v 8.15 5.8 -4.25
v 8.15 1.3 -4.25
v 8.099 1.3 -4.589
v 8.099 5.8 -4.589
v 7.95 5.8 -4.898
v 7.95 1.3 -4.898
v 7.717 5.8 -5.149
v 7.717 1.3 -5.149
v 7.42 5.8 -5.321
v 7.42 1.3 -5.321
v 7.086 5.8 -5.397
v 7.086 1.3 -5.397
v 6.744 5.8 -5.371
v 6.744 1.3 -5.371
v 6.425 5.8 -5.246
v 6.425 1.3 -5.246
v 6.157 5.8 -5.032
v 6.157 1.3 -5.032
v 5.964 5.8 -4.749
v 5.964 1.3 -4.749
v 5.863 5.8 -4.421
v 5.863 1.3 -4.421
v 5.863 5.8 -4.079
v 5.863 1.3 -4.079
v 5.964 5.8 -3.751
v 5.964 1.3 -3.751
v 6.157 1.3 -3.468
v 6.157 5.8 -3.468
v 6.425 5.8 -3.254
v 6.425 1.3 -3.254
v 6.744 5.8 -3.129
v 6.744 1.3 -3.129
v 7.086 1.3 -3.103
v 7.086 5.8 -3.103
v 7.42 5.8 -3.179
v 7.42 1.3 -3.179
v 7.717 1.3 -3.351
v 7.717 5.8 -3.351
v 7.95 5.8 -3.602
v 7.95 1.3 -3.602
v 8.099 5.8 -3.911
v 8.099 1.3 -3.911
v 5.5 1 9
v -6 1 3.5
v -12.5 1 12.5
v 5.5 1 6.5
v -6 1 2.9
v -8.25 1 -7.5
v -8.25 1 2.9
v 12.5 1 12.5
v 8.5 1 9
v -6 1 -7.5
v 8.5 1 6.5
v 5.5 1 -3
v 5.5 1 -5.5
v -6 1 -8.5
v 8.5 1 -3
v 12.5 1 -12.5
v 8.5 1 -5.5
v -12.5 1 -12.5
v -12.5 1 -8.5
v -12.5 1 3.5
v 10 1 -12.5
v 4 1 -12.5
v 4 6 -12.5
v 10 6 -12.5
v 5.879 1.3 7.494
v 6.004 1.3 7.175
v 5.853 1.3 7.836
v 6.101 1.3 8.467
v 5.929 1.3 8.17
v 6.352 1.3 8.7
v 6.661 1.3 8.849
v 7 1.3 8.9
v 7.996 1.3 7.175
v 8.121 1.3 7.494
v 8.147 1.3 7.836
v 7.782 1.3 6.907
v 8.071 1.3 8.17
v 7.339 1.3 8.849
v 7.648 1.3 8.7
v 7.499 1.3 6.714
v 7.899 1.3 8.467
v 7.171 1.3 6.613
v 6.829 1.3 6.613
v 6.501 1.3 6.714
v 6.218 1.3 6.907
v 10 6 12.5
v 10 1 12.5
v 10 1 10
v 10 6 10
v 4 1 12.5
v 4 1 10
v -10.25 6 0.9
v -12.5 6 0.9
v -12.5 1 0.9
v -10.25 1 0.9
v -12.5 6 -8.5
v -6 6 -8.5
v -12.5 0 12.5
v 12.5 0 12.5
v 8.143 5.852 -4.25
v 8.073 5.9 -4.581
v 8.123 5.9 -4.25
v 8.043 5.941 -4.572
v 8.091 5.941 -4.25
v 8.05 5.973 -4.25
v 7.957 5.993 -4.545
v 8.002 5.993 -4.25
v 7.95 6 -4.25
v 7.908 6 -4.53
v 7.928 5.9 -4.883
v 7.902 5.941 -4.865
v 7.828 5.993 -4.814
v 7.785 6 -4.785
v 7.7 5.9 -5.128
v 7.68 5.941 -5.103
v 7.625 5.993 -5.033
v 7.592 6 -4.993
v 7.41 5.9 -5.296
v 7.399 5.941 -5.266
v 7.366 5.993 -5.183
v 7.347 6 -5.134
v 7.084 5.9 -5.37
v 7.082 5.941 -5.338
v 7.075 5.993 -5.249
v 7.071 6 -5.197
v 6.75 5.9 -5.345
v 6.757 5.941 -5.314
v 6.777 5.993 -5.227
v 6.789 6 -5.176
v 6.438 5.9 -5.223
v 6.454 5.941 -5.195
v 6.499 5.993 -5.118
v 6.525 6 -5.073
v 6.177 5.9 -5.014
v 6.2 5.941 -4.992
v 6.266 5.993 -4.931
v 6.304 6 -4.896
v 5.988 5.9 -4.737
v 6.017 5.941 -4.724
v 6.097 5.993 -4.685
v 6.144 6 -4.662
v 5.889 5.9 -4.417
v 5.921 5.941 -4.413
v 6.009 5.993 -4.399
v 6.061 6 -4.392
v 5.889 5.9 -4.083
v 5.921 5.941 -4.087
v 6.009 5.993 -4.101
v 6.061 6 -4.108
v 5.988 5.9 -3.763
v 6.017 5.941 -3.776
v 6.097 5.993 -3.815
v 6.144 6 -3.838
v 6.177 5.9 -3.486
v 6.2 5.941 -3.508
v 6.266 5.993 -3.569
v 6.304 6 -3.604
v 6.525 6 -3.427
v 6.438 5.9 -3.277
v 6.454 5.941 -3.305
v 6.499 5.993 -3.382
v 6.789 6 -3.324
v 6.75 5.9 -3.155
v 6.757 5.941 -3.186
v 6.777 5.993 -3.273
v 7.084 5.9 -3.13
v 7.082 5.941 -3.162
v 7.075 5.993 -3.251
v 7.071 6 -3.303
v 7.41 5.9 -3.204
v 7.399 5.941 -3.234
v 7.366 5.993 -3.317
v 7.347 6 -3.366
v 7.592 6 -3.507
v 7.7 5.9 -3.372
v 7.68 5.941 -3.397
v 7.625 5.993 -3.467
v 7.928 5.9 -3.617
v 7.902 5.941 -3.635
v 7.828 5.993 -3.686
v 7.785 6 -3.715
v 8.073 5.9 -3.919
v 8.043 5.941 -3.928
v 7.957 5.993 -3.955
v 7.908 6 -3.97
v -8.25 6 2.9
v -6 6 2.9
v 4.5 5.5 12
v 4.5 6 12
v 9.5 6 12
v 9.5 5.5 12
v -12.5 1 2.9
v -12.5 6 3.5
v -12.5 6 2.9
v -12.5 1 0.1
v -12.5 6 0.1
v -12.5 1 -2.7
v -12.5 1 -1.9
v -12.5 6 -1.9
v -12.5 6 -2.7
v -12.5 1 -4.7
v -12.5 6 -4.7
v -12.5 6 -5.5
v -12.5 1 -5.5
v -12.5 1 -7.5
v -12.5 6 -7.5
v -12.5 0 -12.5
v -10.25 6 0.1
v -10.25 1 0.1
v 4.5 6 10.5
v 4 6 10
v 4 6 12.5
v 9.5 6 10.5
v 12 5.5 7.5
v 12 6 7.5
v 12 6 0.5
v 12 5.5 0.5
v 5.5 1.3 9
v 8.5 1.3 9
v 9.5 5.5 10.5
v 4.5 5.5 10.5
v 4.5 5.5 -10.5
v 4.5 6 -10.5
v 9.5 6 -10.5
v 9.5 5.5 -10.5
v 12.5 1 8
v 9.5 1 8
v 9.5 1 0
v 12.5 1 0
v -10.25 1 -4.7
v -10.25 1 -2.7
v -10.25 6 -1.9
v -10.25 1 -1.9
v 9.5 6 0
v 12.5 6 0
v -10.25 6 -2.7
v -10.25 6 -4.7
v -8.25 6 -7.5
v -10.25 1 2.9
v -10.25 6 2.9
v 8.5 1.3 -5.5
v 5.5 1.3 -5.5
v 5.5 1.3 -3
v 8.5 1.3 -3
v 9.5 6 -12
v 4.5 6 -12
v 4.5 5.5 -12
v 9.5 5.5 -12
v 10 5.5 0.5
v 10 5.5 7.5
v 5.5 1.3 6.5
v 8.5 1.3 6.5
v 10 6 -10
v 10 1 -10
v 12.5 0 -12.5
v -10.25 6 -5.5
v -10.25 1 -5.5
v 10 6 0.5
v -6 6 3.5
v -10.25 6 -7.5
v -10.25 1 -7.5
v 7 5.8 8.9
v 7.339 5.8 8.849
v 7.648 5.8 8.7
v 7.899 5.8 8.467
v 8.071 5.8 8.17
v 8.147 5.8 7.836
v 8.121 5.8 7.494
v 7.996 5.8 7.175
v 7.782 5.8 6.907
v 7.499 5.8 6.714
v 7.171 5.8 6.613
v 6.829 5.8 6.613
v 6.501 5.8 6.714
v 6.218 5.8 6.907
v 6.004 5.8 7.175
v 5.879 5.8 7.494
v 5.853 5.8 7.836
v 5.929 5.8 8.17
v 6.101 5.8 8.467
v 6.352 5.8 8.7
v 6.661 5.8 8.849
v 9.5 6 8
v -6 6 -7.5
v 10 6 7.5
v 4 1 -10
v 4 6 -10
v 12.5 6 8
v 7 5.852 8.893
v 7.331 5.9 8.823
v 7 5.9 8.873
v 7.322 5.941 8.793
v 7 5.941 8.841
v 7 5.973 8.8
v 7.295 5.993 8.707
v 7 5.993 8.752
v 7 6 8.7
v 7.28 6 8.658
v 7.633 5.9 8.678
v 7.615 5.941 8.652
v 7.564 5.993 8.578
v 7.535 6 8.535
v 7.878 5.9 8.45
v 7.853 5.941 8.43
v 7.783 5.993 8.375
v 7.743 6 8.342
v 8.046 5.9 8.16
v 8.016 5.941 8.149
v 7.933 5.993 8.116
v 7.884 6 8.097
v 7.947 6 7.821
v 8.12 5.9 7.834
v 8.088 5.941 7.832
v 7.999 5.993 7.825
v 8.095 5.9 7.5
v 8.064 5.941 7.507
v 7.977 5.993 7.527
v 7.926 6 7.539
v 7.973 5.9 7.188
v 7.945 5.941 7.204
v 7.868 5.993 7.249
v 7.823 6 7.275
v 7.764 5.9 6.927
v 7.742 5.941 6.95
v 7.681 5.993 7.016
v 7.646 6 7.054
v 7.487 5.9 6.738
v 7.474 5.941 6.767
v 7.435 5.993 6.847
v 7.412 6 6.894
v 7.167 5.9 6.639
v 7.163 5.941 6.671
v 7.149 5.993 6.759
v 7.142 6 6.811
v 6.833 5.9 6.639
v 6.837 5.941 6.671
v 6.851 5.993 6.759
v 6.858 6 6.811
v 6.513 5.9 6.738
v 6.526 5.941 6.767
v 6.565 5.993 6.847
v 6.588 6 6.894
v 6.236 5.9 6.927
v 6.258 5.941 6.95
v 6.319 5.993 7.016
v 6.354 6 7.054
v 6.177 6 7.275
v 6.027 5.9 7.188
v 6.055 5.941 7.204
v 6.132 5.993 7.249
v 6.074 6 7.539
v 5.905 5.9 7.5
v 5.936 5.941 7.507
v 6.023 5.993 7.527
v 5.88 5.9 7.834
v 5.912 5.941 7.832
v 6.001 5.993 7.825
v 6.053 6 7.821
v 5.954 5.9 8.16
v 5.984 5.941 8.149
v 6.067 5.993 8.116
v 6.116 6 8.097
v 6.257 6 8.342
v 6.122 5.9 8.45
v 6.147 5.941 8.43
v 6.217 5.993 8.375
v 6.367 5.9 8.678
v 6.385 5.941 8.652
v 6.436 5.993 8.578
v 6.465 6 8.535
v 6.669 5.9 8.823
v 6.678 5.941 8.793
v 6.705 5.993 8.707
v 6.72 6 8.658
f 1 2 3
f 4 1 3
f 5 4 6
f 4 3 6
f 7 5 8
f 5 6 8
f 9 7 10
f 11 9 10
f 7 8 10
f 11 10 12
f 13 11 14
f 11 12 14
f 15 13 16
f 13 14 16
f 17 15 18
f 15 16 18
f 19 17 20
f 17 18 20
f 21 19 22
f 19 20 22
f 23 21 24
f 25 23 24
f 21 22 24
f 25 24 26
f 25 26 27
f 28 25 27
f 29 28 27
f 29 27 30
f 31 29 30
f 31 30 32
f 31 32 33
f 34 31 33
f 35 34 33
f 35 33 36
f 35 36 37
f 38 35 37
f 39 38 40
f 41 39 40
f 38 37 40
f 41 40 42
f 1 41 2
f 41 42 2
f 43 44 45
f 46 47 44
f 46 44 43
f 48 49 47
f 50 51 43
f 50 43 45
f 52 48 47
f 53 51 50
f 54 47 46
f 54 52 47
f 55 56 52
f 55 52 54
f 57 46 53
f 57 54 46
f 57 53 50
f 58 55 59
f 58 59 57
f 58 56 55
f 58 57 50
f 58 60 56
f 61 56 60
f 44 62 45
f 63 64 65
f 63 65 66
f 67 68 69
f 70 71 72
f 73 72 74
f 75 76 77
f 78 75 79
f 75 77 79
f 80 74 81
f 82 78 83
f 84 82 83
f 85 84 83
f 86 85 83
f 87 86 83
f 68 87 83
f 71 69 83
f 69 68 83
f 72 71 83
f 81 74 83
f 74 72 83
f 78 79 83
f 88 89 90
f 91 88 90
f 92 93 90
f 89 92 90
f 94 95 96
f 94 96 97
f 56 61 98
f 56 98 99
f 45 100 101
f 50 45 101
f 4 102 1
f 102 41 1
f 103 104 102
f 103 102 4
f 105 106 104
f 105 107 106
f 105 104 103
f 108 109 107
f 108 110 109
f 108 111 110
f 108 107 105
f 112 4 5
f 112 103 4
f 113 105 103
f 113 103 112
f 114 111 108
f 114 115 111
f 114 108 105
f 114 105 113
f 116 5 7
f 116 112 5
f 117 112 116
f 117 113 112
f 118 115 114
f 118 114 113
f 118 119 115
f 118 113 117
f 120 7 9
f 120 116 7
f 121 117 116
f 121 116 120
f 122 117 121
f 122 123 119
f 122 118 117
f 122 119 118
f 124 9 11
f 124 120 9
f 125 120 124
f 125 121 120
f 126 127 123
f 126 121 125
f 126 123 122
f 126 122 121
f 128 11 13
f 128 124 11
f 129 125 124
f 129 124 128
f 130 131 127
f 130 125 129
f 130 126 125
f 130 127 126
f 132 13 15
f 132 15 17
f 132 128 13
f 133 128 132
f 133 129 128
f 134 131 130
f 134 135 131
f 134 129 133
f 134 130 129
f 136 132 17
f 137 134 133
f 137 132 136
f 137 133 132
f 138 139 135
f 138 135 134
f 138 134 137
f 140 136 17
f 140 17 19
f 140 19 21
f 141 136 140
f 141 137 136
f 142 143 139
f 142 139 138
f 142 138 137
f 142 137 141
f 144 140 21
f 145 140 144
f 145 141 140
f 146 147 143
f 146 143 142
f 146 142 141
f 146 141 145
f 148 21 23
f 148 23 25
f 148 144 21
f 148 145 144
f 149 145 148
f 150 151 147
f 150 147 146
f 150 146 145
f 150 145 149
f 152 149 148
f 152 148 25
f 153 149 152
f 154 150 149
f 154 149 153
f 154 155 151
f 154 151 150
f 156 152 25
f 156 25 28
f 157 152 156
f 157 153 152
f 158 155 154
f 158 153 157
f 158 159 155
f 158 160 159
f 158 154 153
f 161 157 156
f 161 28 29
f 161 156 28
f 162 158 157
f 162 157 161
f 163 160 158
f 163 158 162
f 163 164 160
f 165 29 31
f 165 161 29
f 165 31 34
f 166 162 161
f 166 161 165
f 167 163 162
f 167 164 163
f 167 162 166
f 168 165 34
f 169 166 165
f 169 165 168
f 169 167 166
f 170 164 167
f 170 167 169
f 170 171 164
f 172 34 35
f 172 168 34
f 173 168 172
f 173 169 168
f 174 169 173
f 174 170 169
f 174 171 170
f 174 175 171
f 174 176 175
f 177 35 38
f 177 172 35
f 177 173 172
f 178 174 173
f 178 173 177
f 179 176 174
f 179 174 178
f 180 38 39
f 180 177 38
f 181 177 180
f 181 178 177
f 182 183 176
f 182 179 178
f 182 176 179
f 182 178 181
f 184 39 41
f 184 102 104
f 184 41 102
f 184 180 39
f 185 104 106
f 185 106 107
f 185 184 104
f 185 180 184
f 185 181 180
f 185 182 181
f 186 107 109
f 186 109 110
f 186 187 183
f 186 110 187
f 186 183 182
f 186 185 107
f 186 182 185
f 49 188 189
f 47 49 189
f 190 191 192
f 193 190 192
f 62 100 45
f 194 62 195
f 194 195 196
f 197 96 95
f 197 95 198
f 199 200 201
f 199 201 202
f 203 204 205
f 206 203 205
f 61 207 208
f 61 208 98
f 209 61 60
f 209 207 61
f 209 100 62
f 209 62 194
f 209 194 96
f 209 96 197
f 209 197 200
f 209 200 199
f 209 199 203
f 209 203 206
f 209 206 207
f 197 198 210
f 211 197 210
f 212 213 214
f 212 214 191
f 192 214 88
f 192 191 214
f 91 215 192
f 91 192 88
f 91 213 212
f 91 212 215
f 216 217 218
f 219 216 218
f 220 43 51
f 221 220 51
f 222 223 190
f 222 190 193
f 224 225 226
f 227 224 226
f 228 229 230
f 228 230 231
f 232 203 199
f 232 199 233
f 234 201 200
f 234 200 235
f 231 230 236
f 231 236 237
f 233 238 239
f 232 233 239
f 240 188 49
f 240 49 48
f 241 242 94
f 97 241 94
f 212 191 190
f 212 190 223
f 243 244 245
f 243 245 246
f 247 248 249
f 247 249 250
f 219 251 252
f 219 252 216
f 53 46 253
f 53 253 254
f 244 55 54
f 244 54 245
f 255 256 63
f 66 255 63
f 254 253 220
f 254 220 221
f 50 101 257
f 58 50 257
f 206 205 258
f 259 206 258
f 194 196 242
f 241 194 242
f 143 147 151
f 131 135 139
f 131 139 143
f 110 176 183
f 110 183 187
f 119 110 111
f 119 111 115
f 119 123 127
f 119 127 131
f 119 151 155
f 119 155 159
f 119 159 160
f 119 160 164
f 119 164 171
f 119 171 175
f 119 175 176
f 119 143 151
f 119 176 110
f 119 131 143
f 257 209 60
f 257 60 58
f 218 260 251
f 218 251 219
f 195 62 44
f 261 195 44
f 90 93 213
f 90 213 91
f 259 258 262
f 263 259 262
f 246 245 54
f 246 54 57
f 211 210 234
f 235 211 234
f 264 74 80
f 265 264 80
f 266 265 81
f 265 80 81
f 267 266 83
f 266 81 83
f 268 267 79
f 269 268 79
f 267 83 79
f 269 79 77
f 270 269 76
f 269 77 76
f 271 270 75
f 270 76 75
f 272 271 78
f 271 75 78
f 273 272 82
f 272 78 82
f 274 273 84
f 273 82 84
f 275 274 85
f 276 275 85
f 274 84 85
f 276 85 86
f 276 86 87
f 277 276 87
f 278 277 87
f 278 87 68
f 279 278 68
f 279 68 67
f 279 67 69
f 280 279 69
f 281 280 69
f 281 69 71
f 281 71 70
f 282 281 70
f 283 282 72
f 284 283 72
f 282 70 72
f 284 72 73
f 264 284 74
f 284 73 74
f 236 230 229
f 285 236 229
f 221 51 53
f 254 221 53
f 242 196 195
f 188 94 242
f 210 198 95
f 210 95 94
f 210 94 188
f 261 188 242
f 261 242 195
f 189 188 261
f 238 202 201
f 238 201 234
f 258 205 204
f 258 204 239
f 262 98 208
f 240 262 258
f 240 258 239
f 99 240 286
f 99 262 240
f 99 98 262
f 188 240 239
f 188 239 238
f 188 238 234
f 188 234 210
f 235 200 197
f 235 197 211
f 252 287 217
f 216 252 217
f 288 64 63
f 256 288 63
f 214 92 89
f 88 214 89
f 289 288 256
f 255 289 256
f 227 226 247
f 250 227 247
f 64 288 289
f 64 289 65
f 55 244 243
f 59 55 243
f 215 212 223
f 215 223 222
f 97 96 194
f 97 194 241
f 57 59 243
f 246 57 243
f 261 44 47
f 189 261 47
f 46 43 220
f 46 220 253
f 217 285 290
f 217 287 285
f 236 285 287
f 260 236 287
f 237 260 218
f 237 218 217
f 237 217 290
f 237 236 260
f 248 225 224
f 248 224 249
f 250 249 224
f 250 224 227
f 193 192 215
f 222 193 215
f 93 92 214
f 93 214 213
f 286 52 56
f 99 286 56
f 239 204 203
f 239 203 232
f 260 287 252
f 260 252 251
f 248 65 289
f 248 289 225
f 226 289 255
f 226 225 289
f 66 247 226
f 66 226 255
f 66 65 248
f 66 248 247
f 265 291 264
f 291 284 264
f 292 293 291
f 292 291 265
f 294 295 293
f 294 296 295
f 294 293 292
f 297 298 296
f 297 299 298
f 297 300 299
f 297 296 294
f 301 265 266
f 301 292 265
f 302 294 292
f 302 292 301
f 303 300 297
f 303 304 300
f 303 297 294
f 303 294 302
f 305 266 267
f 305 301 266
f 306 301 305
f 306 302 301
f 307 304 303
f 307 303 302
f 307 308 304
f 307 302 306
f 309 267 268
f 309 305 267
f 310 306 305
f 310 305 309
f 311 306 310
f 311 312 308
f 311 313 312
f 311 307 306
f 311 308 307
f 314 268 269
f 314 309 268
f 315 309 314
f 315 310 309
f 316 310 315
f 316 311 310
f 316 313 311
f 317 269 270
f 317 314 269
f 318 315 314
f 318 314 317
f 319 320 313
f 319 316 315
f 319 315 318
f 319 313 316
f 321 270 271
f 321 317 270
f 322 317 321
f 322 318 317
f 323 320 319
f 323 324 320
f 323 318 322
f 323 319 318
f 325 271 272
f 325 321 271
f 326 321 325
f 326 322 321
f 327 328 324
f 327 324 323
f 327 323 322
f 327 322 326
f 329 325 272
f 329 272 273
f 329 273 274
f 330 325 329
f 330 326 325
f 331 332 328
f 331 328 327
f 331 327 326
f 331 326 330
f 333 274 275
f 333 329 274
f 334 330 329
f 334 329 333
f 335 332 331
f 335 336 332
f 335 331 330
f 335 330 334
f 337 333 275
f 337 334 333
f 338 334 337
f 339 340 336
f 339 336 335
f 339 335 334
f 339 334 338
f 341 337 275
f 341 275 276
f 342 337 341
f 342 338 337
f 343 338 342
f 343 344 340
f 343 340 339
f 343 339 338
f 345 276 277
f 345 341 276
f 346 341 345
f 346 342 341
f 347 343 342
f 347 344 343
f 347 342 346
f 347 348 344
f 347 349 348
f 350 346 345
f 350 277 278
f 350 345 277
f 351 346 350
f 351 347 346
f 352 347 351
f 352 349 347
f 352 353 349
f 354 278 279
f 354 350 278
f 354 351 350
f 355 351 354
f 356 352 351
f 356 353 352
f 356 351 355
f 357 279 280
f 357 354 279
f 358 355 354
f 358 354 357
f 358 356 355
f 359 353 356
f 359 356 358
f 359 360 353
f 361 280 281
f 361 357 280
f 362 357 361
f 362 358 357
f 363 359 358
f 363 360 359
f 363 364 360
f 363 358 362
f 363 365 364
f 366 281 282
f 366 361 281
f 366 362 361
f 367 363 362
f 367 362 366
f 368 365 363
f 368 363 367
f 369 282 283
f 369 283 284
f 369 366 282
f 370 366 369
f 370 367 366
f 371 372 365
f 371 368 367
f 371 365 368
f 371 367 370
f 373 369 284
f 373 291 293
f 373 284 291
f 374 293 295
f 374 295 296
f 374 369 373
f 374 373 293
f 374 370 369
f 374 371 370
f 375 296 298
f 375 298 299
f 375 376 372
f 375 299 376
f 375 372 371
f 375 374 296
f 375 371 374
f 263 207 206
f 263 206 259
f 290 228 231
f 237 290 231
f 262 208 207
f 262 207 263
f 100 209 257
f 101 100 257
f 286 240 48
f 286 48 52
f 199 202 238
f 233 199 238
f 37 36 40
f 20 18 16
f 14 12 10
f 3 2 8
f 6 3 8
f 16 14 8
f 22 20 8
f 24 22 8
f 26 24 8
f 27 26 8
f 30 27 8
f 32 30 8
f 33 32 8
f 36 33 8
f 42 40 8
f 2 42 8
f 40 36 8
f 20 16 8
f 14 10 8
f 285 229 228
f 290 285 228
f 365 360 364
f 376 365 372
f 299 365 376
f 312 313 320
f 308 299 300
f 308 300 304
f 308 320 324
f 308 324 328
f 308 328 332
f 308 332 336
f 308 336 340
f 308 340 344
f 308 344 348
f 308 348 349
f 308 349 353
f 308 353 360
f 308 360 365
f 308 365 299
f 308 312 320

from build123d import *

# Parameters (mm, degrees)
SKETCH1_W             = 25
SKETCH1_H             = 25
BOSS_EXTRUDE1_DEPTH   = 1
SKETCH2_W             = 3
SKETCH2_H             = 2.5
SKETCH2_H_2           = 2.75
BOSS_EXTRUDE2_DEPTH   = 5
SKETCH3_W             = 2
SKETCH3_H             = 7
CUT_EXTRUDE1_DEPTH    = 0.5
SKETCH4_W             = 6
SKETCH4_H             = 2.5
BOSS_EXTRUDE3_DEPTH   = 5
BOSS_EXTRUDE3_2_DEPTH = 5
SKETCH5_W             = 5
SKETCH5_H             = 1.5
CUT_EXTRUDE2_DEPTH    = 0.5
SKETCH6_W             = 6.5
SKETCH6_H             = 12
BOSS_EXTRUDE4_DEPTH   = 5
SKETCH7_W             = 2.25
SKETCH7_H             = 2
CUT_EXTRUDE3_DEPTH    = 5
SKETCH8_W             = 2.25
SKETCH8_H             = 10.4
CUT_EXTRUDE4_DEPTH    = 5
SKETCH9_W             = 3
SKETCH9_H             = 2.5
BOSS_EXTRUDE5_DEPTH   = 0.3
SKETCH10_R            = 1.15
BOSS_EXTRUDE6_DEPTH   = 4.7
FILLET1_R             = 0.2
LPATTERN1_START       = 1.3
LPATTERN1_OUTLINE_R   = 1.15
LPATTERN1_DEPTH       = 4.7
LPATTERN1_START_2     = -5.5
LPATTERN1_2_OUTLINE_W = 3
LPATTERN1_2_OUTLINE_H = 0.3
LPATTERN1_2_DEPTH     = 2.5
FILLET2_R             = 0.2


# Read off the part's stored shape, not the designer's step: LPattern1
with BuildPart() as part:
    # Sketch1 → Boss-Extrude1 (new body)
    with BuildSketch(Plane(origin=(0, 0, 0), x_dir=(1, 0, 0), z_dir=(0, 1, 0))):
        Rectangle(SKETCH1_W, SKETCH1_H)
    extrude(amount=BOSS_EXTRUDE1_DEPTH)

    # Sketch6 → Boss-Extrude4 (add)
    with BuildSketch(Plane(origin=(0, 1, 0), x_dir=(1, 0, 0), z_dir=(0, 1, 0))):
        with Locations((-9.25, 2.5)):
            Rectangle(SKETCH6_W, SKETCH6_H)
    extrude(amount=BOSS_EXTRUDE4_DEPTH)

    # Sketch7 → Cut-Extrude3 (cut)
    with BuildSketch(Plane(origin=(0, 6, 0), x_dir=(1, 0, 0), z_dir=(0, 1, 0))):
        with Locations((-11.375, 6.5)):
            Rectangle(SKETCH7_W, SKETCH7_H)
        with Locations((-11.375, 3.7)):
            Rectangle(SKETCH7_W, SKETCH7_H)
        with Locations((-11.375, 0.9)):
            Rectangle(SKETCH7_W, SKETCH7_H)
        with Locations((-11.375, -1.9)):
            Rectangle(SKETCH7_W, SKETCH7_H)
    extrude(amount=-CUT_EXTRUDE3_DEPTH, mode=Mode.SUBTRACT)

    # Sketch8 → Cut-Extrude4 (cut)
    with BuildSketch(Plane(origin=(0, 6, 0), x_dir=(1, 0, 0), z_dir=(0, 1, 0))):
        with Locations((-7.125, 2.3)):
            Rectangle(SKETCH8_W, SKETCH8_H)
    extrude(amount=-CUT_EXTRUDE4_DEPTH, mode=Mode.SUBTRACT)

    # Sketch9 → Boss-Extrude5 (add)
    with BuildSketch(Plane(origin=(0, 1, 0), x_dir=(1, 0, 0), z_dir=(0, 1, 0))):
        with Locations((7, -7.75)):
            Rectangle(SKETCH9_W, SKETCH9_H)
    extrude(amount=BOSS_EXTRUDE5_DEPTH)

    # LPattern1 2 outline → LPattern1 2 (add)
    with BuildSketch(Plane.XY.offset(LPATTERN1_START_2)):
        with Locations((7, 1.15)):
            Rectangle(LPATTERN1_2_OUTLINE_W, LPATTERN1_2_OUTLINE_H)
    extrude(amount=LPATTERN1_2_DEPTH)


with BuildPart() as body_2:
    # Sketch2 → Boss-Extrude2 (new body)
    with BuildSketch(Plane(origin=(0, 1, 0), x_dir=(1, 0, 0), z_dir=(0, 1, 0))):
        with Locations((11, -6.75)):
            Rectangle(SKETCH2_W, SKETCH2_H)
        with Locations((11, -4.125)):
            Rectangle(SKETCH2_W, SKETCH2_H_2)
        with Locations((11, -1.375)):
            Rectangle(SKETCH2_W, SKETCH2_H_2)
    extrude(amount=BOSS_EXTRUDE2_DEPTH)

    # Sketch3 → Cut-Extrude1 (cut)
    with BuildSketch(Plane(origin=(0, 6, 0), x_dir=(1, 0, 0), z_dir=(0, 1, 0))):
        with Locations((11, -4)):
            Rectangle(SKETCH3_W, SKETCH3_H)
    extrude(amount=-CUT_EXTRUDE1_DEPTH, mode=Mode.SUBTRACT)


with BuildPart() as body_3:
    # Sketch4 → Boss-Extrude3 (new body)
    with BuildSketch(Plane(origin=(0, 1, 0), x_dir=(1, 0, 0), z_dir=(0, 1, 0))):
        with Locations((7, -11.25)):
            Rectangle(SKETCH4_W, SKETCH4_H)
    extrude(amount=BOSS_EXTRUDE3_DEPTH)


with BuildPart() as body_4:
    # Sketch4 → Boss-Extrude3 2 (new body)
    with BuildSketch(Plane(origin=(0, 1, 0), x_dir=(1, 0, 0), z_dir=(0, 1, 0))):
        with Locations((7, 11.25)):
            Rectangle(SKETCH4_W, SKETCH4_H)
    extrude(amount=BOSS_EXTRUDE3_2_DEPTH)


with BuildPart() as cut_extrude2_tool:
    # Sketch5 → Cut-Extrude2 (new body)
    with BuildSketch(Plane(origin=(0, 6, 0), x_dir=(1, 0, 0), z_dir=(0, 1, 0))):
        with Locations((7, -11.25)):
            Rectangle(SKETCH5_W, SKETCH5_H)
        with Locations((7, 11.25)):
            Rectangle(SKETCH5_W, SKETCH5_H)
    extrude(amount=-CUT_EXTRUDE2_DEPTH)


with BuildPart() as body_3_1:
    add(body_3.part)

    # Cut-Extrude2: cut by cut_extrude2_tool
    add(cut_extrude2_tool.part, mode=Mode.SUBTRACT)


with BuildPart() as body_4_1:
    add(body_4.part)

    # Cut-Extrude2: cut by cut_extrude2_tool
    add(cut_extrude2_tool.part, mode=Mode.SUBTRACT)


with BuildPart() as body_5:
    # Sketch10 → Boss-Extrude6 (new body)
    with BuildSketch(Plane(origin=(0, 1.3, 0), x_dir=(1, 0, 0), z_dir=(0, 1, 0))):
        with Locations(Location((7, -7.75, 0), (0, 0, 270))):
            Circle(SKETCH10_R)
    extrude(amount=BOSS_EXTRUDE6_DEPTH)

    # Fillet1
    fillet1_edges = [body_5.edges().sort_by_distance(p)[0] for p in [
        (7, 6, 6.6),
    ]]
    fillet(fillet1_edges, radius=FILLET1_R)


with BuildPart() as body_6:
    # LPattern1 outline → LPattern1 (new body)
    with BuildSketch(Plane(origin=(0, 0, 0), x_dir=(1, 0, 0), z_dir=(0, 1, 0)).offset(LPATTERN1_START)):
        with Locations((7, 4.25)):
            Circle(LPATTERN1_OUTLINE_R)
    extrude(amount=LPATTERN1_DEPTH)

    # Fillet2
    fillet2_edges = [body_6.edges().sort_by_distance(p)[0] for p in [
        (5.85, 6, -4.25),
    ]]
    fillet(fillet2_edges, radius=FILLET2_R)


solid = Compound([part.part, body_2.part, body_3_1.part, body_4_1.part, body_5.part, body_6.part])
